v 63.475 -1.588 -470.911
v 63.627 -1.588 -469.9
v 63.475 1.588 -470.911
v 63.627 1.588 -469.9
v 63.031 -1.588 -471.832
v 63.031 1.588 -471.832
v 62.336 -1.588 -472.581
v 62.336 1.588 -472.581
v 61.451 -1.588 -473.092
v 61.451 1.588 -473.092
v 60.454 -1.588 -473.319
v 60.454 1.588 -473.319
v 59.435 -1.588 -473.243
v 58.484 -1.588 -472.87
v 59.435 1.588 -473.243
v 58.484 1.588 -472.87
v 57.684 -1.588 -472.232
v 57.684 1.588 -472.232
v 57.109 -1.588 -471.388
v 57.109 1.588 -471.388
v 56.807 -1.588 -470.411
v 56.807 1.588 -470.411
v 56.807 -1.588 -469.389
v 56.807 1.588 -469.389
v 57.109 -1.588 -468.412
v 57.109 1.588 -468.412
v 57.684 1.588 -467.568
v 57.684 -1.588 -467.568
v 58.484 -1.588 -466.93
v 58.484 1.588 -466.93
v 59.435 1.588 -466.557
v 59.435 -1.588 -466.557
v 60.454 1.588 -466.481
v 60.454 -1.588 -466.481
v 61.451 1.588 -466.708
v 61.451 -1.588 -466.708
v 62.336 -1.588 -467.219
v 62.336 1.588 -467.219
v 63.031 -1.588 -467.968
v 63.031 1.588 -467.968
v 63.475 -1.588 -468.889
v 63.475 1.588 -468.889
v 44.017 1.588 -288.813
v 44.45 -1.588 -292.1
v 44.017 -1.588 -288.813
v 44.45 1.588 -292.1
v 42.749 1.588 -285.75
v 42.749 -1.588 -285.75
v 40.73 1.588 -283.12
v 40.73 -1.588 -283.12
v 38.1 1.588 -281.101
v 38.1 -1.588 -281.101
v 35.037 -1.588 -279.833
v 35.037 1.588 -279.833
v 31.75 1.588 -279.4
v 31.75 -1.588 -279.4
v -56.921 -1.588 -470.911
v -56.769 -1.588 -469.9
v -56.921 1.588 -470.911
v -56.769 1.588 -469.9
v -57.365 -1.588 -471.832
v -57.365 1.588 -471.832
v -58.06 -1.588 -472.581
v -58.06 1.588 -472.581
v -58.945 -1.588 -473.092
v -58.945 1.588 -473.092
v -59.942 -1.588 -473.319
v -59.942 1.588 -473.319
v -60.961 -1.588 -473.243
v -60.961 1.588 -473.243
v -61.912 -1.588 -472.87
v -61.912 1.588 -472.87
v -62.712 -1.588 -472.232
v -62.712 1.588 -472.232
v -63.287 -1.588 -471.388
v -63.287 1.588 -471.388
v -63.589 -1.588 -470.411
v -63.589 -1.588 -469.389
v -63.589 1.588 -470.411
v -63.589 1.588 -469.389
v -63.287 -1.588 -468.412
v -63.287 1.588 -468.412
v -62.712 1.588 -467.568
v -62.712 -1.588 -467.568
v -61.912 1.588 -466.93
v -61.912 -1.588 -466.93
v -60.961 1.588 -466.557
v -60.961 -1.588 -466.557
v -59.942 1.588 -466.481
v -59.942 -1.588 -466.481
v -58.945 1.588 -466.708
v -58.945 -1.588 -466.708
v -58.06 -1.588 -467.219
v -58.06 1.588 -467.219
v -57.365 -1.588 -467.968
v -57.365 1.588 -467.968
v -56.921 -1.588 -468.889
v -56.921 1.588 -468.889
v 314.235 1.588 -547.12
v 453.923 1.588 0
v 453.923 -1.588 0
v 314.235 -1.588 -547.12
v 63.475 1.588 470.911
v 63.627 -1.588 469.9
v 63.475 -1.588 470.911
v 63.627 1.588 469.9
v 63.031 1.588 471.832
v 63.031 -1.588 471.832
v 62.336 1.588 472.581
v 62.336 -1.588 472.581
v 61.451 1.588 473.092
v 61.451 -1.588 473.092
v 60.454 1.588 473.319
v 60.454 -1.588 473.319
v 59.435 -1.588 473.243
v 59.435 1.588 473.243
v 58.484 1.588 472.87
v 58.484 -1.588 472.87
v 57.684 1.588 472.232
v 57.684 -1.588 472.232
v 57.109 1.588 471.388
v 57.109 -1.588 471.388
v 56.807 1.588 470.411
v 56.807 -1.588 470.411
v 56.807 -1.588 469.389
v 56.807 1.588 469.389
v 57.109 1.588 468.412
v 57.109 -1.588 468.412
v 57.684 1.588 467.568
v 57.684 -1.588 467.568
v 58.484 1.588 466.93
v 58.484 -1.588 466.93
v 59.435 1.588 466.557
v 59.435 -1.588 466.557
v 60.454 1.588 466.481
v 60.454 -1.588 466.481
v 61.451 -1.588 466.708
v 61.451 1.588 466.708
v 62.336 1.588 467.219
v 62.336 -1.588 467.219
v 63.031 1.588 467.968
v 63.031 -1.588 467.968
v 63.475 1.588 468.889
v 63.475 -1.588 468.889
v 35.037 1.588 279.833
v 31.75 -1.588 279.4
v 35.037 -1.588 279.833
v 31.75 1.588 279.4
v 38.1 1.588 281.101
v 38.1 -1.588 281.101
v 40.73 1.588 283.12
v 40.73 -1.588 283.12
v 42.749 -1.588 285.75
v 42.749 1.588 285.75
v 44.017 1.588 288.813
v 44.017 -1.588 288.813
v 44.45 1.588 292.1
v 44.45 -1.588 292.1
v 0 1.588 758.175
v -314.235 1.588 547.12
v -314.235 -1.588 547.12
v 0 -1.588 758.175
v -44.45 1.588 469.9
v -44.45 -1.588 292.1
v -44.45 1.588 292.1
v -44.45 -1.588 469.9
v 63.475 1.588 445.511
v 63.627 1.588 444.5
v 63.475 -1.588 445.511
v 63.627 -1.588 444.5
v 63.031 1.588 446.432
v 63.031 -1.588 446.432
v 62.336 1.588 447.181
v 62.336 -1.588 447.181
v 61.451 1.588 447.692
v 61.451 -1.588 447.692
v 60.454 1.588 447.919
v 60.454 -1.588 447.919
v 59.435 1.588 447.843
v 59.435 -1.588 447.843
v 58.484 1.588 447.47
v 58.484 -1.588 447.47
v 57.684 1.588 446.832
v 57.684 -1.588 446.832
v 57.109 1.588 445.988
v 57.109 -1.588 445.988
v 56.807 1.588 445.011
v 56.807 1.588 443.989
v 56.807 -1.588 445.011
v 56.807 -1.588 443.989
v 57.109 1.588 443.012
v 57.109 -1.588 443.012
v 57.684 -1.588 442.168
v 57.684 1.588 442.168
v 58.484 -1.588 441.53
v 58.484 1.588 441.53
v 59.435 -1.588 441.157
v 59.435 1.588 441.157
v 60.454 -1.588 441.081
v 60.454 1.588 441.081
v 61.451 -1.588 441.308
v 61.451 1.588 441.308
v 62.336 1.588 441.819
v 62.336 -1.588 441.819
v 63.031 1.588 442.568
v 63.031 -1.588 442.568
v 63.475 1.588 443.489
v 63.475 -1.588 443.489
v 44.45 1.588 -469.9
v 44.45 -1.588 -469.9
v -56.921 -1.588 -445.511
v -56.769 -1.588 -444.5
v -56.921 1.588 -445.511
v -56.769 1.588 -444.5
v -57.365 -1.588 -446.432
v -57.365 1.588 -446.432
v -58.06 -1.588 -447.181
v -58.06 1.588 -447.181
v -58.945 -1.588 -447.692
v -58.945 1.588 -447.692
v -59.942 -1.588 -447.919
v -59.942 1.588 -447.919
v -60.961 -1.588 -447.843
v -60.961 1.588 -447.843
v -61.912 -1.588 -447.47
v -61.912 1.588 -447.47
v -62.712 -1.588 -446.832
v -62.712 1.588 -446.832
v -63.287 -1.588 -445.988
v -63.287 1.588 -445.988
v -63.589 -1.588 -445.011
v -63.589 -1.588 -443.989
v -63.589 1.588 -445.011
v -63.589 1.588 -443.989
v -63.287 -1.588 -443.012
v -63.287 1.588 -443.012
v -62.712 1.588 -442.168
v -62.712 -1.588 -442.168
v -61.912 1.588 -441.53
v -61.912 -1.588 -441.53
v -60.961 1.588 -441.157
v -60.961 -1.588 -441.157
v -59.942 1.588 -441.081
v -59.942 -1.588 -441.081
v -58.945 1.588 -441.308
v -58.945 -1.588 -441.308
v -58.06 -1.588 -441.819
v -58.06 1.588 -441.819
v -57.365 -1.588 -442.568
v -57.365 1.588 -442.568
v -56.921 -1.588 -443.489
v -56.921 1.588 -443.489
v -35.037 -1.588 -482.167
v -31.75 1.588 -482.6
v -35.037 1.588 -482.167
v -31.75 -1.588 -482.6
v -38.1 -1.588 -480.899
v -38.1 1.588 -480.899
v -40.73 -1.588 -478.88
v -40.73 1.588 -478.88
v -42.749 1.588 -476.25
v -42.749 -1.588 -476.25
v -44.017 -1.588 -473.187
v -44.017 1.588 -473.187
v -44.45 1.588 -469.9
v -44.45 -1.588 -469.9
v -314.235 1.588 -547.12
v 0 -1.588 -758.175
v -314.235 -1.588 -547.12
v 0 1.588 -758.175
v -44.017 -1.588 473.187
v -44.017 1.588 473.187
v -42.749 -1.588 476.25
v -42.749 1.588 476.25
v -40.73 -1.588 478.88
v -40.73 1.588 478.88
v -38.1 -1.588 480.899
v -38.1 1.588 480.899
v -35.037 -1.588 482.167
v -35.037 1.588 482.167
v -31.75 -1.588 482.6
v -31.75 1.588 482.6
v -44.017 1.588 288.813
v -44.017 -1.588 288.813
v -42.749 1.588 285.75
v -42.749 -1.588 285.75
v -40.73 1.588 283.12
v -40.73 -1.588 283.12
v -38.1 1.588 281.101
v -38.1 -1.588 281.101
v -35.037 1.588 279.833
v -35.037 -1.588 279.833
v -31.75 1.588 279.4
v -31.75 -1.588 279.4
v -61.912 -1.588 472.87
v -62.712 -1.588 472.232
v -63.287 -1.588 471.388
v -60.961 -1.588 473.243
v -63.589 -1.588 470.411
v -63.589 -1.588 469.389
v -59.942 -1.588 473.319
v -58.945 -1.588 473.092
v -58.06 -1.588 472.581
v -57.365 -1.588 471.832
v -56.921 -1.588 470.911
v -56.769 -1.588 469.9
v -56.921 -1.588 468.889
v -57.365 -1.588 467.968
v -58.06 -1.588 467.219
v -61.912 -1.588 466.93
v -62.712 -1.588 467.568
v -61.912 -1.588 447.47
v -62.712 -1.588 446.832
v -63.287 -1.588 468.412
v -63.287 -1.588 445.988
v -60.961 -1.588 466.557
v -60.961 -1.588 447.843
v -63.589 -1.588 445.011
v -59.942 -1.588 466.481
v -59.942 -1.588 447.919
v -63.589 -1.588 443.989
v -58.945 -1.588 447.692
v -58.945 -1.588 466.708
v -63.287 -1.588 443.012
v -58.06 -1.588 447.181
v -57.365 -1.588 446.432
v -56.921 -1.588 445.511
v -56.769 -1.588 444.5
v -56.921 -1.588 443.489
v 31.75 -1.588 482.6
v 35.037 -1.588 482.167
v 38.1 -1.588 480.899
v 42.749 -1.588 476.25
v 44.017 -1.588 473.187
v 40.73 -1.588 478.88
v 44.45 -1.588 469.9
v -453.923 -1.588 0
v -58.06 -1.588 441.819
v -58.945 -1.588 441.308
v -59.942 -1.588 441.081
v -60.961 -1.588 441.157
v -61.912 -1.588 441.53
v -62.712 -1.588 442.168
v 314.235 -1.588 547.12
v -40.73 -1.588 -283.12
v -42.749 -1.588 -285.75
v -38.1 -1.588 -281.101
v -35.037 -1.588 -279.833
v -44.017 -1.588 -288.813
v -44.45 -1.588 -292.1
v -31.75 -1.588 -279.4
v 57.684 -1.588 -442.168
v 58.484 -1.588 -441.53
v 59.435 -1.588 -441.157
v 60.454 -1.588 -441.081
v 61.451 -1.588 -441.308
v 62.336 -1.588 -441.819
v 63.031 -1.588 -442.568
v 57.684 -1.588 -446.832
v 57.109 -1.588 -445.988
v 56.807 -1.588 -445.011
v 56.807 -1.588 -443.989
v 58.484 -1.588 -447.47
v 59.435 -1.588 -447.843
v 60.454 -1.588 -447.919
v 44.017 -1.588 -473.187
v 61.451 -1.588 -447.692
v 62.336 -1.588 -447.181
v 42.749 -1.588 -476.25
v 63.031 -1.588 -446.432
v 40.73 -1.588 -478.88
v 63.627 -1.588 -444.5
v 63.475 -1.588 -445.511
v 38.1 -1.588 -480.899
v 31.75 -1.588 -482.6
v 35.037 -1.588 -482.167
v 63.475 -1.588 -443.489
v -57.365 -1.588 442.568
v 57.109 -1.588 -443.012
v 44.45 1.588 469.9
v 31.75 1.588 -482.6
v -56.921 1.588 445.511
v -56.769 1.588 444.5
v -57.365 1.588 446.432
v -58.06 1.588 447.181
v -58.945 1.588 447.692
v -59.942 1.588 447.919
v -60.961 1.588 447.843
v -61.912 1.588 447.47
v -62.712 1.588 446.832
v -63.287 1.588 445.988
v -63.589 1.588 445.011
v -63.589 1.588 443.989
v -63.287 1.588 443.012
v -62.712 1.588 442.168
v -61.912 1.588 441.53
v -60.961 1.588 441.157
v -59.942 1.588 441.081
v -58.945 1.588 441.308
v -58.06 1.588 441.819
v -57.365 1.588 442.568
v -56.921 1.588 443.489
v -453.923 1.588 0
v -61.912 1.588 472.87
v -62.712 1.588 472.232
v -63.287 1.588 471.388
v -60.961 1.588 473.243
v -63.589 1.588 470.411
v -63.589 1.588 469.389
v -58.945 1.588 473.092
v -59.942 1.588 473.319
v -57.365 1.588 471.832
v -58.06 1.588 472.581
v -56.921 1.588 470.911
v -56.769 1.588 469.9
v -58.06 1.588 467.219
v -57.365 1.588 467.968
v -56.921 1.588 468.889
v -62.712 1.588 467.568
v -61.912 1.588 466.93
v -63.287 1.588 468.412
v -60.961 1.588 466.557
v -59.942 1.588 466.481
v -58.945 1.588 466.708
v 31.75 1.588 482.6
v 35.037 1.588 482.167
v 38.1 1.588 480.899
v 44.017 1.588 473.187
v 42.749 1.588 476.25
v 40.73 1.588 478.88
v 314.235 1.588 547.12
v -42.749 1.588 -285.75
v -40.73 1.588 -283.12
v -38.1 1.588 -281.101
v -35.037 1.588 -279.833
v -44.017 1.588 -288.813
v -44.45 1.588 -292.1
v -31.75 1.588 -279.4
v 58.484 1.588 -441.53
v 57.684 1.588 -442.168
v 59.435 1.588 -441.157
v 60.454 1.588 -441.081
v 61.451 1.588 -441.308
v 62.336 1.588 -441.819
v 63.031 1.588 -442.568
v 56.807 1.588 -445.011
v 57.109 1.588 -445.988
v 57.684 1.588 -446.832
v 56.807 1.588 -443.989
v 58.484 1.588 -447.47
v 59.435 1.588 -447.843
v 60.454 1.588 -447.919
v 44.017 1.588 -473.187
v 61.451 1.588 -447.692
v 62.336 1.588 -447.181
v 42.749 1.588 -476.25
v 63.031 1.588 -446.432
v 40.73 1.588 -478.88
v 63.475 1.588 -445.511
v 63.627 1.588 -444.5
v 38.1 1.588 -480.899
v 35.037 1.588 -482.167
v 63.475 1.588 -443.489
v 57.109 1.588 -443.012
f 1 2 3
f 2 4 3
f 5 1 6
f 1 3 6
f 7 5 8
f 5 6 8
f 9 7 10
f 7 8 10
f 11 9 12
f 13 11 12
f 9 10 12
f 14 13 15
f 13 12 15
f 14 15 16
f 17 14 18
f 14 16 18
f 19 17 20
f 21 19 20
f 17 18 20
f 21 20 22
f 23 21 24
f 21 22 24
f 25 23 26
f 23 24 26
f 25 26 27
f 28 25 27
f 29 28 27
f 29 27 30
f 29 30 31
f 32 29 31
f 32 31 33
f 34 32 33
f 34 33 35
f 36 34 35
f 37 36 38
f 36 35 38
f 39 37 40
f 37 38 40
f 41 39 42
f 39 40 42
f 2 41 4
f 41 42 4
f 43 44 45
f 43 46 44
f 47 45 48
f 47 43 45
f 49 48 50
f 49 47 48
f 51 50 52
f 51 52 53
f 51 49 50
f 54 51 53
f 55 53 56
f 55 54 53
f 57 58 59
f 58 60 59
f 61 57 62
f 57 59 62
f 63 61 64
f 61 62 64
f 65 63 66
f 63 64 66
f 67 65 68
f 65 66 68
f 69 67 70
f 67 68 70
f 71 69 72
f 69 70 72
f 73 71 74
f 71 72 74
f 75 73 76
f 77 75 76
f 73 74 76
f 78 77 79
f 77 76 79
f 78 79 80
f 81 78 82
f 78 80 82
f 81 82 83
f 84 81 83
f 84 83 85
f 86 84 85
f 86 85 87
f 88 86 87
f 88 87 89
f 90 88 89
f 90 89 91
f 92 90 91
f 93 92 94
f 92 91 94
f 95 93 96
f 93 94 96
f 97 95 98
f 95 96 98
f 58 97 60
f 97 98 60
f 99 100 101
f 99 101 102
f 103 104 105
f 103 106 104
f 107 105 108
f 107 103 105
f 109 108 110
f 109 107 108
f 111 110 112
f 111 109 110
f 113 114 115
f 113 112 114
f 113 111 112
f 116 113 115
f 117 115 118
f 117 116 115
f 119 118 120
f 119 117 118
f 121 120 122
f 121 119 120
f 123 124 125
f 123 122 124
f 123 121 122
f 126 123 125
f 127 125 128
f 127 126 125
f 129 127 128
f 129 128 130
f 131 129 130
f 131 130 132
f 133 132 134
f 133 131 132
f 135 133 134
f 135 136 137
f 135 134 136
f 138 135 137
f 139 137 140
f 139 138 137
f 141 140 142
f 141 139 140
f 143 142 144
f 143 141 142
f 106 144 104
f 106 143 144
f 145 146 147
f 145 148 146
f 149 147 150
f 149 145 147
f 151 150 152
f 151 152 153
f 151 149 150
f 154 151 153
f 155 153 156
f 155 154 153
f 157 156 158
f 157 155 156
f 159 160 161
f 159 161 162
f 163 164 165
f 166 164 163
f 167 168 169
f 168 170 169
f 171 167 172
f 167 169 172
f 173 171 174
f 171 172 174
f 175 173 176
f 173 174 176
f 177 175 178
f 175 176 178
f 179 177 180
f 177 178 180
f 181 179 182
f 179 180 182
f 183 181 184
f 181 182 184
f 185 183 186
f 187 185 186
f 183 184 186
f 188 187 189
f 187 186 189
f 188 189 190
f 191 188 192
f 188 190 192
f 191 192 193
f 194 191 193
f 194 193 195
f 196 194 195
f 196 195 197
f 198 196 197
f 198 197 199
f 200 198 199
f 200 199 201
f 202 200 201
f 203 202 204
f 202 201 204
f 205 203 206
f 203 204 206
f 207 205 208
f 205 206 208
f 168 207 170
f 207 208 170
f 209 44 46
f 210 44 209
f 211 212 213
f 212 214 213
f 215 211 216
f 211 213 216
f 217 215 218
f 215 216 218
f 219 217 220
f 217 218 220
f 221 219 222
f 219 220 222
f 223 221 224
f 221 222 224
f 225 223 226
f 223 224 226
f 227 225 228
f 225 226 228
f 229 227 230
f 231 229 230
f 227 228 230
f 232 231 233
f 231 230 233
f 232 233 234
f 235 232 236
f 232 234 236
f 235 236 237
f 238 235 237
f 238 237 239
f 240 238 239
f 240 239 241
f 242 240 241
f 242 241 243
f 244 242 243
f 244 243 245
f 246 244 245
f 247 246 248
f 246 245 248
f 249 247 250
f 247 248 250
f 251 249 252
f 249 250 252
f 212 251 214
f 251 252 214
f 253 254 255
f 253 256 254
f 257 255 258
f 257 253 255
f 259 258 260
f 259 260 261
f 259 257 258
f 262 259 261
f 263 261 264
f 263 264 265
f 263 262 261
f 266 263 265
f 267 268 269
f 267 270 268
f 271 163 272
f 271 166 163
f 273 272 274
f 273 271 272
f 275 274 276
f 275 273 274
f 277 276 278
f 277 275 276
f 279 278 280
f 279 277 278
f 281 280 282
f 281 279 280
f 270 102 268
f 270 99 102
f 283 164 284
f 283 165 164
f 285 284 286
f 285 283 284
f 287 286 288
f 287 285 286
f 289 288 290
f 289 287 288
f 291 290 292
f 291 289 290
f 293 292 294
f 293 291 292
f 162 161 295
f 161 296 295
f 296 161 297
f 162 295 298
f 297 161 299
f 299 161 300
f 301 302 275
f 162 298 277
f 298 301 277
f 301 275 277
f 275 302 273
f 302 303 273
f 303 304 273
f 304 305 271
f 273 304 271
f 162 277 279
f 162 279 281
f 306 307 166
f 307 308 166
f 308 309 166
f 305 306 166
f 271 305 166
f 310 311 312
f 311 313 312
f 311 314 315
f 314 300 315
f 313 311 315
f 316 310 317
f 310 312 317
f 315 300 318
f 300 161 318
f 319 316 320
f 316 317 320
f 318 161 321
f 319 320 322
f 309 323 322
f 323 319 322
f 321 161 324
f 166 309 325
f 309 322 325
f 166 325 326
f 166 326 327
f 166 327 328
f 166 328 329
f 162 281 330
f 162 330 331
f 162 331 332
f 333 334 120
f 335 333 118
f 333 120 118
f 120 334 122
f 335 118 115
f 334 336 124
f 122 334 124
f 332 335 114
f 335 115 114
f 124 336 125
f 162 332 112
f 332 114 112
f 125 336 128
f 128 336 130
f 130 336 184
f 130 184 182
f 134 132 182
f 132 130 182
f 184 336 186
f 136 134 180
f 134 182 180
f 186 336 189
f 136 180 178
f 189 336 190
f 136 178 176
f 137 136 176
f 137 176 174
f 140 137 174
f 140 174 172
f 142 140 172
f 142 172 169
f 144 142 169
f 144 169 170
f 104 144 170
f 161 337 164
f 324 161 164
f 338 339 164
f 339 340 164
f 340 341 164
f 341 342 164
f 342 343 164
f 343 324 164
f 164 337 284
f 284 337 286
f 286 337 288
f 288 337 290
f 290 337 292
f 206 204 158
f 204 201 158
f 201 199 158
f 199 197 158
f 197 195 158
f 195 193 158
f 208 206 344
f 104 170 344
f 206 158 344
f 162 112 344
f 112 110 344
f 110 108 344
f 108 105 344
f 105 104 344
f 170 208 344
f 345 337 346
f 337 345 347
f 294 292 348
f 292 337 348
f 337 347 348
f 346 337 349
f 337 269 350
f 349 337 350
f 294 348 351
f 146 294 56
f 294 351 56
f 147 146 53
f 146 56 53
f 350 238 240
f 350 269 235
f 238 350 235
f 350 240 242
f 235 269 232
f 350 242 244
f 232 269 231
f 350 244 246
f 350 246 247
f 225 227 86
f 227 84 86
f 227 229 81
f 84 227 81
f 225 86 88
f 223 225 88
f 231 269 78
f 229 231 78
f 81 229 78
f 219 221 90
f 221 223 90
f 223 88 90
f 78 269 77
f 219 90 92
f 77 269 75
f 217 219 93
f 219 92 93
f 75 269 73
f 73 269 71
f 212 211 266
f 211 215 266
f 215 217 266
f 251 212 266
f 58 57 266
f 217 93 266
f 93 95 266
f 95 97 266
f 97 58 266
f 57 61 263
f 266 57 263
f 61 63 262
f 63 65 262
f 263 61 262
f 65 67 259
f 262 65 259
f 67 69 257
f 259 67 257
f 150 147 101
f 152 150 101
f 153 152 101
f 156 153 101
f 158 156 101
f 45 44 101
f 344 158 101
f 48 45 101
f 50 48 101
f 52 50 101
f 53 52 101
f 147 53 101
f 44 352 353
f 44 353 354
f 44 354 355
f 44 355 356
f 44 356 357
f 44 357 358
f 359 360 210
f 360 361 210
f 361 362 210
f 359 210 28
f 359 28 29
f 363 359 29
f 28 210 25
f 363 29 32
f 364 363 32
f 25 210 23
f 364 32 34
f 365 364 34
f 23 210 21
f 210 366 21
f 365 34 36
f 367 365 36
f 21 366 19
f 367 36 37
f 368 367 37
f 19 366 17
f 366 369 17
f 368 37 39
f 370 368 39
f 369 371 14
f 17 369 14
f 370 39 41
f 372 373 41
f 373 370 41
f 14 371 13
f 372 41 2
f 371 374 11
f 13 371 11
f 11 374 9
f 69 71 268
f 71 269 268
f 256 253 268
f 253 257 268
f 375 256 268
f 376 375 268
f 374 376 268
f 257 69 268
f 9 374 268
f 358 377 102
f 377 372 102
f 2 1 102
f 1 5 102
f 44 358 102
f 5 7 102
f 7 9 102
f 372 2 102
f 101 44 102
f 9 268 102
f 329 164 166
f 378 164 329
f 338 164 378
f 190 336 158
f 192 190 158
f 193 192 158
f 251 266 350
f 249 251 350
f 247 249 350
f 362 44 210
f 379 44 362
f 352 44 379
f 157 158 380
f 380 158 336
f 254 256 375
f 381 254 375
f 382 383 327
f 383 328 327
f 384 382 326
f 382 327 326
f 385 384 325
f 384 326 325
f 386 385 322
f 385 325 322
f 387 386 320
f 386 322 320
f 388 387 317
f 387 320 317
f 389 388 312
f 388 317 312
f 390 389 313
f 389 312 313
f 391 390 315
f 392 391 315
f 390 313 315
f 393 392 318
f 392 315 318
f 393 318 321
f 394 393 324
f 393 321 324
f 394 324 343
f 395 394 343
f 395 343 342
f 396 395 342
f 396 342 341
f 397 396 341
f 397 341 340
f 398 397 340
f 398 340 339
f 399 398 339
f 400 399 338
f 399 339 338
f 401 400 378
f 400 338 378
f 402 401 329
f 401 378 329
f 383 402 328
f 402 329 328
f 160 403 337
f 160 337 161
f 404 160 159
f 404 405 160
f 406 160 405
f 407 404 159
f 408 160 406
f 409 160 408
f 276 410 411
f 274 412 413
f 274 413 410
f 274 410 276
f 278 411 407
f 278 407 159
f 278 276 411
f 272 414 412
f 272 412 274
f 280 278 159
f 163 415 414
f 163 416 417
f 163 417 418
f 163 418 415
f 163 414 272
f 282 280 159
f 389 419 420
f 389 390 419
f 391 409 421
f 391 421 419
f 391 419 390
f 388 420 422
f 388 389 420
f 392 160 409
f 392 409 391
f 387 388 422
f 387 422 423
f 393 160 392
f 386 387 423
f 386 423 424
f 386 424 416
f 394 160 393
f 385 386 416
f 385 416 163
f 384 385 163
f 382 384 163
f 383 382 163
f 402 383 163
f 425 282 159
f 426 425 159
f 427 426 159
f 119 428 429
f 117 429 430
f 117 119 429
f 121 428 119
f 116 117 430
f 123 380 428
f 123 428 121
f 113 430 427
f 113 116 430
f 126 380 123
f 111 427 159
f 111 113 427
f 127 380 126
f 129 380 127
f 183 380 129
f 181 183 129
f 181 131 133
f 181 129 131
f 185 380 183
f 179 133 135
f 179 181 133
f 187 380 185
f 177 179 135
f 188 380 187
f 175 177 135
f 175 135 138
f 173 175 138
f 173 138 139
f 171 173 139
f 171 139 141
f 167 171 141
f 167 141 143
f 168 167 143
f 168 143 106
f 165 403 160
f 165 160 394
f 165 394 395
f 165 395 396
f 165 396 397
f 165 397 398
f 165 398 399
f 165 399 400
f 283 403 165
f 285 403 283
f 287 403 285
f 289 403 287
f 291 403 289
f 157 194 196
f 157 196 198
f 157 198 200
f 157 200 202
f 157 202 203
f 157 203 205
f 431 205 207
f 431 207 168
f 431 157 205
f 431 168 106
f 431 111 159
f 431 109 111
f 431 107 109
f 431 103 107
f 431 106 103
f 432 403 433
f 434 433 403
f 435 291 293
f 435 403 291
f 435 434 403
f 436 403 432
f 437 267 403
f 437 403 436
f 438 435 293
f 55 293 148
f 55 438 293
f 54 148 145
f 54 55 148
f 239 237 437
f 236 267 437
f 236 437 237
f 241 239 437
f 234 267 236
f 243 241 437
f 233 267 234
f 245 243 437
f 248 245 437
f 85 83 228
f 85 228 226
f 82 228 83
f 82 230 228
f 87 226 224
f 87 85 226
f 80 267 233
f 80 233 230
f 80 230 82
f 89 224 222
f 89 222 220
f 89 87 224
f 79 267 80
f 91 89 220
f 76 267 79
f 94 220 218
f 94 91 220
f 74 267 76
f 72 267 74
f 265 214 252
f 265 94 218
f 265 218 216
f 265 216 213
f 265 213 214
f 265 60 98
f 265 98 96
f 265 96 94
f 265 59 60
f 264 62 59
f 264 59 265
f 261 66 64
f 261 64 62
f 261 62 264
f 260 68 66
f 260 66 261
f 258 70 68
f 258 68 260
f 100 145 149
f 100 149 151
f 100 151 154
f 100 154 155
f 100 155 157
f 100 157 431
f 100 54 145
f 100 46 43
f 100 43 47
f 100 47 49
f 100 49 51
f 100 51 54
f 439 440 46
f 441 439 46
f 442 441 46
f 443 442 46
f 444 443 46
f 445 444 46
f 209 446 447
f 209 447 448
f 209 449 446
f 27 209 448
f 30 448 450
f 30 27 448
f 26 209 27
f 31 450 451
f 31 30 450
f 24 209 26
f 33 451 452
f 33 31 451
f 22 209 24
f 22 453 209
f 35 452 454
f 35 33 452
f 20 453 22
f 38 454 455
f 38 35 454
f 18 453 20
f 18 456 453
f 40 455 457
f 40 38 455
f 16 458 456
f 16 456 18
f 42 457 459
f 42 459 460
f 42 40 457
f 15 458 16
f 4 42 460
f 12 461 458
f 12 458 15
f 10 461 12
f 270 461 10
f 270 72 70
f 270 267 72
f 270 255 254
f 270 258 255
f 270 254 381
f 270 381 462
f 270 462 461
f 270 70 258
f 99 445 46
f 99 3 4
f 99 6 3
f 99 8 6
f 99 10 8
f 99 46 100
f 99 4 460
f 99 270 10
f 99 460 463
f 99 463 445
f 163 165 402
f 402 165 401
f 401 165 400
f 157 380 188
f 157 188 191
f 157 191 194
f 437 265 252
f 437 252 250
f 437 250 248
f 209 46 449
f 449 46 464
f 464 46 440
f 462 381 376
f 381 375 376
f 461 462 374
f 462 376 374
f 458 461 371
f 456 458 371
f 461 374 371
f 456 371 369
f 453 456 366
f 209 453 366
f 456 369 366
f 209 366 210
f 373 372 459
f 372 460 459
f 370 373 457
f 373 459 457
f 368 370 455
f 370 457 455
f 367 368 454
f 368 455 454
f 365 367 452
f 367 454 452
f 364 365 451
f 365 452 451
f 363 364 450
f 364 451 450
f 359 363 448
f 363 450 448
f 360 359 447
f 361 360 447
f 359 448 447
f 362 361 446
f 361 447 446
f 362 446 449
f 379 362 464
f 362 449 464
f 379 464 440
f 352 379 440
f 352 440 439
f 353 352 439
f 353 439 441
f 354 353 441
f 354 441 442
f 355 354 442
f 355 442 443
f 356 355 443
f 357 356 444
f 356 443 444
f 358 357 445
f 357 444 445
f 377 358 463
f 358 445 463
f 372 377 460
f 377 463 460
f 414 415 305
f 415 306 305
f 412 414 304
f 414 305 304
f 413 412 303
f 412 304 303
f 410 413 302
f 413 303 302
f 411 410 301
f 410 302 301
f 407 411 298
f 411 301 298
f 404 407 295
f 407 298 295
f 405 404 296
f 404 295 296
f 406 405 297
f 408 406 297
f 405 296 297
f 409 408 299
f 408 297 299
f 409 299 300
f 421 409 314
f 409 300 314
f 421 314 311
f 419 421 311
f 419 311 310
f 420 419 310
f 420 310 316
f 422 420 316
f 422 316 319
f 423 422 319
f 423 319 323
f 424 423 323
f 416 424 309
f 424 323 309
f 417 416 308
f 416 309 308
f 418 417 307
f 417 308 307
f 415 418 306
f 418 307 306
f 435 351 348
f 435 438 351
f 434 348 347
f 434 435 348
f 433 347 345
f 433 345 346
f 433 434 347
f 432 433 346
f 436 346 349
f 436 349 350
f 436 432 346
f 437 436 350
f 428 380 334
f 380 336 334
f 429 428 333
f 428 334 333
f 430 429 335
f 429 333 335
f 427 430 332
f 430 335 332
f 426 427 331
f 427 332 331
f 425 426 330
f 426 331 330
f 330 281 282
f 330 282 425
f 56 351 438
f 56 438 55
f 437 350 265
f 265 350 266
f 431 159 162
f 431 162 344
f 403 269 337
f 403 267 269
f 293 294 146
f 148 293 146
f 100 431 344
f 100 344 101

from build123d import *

# Parameters (mm, degrees)
BOSS_EXTRUDE1_DEPTH  = 1.5875
SKETCH2_W            = 88.9
SKETCH2_H            = 203.2
SKETCH2_R            = 3.429
CUT_EXTRUDE1_DEPTH   = 2.5875
FILLET1_R            = 12.7
FILLET1_OF_MIRROR1_R = 12.7


with BuildPart() as part:
    # Sketch1 → Boss-Extrude1 (new body, symmetric)
    with BuildSketch(Plane(origin=(0, 0, 0), x_dir=(1, 0, 0), z_dir=(0, 1, 0))):
        Polygon((-314.234696616, 547.119578242), (-453.923150307, 0), (-314.234696616, -547.119578242), (0, -758.175325655), (314.234696616, -547.119578242), (453.923150307, 0), (314.234696616, 547.119578242), (0, 758.175325655), align=None)
    extrude(amount=BOSS_EXTRUDE1_DEPTH, both=True)

    # Sketch2 → Cut-Extrude1 (cut, symmetric)
    with BuildSketch(Plane(origin=(0, 0, 0), x_dir=(1, 0, 0), z_dir=(0, 1, 0))):
        with Locations((0, 381)):
            Rectangle(SKETCH2_W, SKETCH2_H)
        with Locations((-60.198, 469.9)):
            Circle(SKETCH2_R)
        with Locations((-60.198, 444.5)):
            Circle(SKETCH2_R)
        with Locations((60.198, 444.5)):
            Circle(SKETCH2_R)
        with Locations((60.198, 469.9)):
            Circle(SKETCH2_R)
    cut_extrude1 = extrude(amount=CUT_EXTRUDE1_DEPTH, both=True, mode=Mode.SUBTRACT)

    # Fillet1
    fillet1_edges = [part.edges().sort_by_distance(p)[0] for p in [
        (44.45, 0, -279.4),
        (-44.45, 0, -279.4),
        (-44.45, 0, -482.6),
        (44.45, 0, -482.6),
    ]]
    fillet(fillet1_edges, radius=FILLET1_R)

    # Mirror1: Cut-Extrude1 across plane
    add(cut_extrude1.mirror(Plane.XY), mode=Mode.SUBTRACT)

    # Fillet1 of Mirror1
    fillet1_of_mirror1_edges = [part.edges().sort_by_distance(p)[0] for p in [
        (44.45, 0, 279.4),
        (-44.45, 0, 279.4),
        (-44.45, 0, 482.6),
        (44.45, 0, 482.6),
    ]]
    fillet(fillet1_of_mirror1_edges, radius=FILLET1_OF_MIRROR1_R)


solid = part.part
